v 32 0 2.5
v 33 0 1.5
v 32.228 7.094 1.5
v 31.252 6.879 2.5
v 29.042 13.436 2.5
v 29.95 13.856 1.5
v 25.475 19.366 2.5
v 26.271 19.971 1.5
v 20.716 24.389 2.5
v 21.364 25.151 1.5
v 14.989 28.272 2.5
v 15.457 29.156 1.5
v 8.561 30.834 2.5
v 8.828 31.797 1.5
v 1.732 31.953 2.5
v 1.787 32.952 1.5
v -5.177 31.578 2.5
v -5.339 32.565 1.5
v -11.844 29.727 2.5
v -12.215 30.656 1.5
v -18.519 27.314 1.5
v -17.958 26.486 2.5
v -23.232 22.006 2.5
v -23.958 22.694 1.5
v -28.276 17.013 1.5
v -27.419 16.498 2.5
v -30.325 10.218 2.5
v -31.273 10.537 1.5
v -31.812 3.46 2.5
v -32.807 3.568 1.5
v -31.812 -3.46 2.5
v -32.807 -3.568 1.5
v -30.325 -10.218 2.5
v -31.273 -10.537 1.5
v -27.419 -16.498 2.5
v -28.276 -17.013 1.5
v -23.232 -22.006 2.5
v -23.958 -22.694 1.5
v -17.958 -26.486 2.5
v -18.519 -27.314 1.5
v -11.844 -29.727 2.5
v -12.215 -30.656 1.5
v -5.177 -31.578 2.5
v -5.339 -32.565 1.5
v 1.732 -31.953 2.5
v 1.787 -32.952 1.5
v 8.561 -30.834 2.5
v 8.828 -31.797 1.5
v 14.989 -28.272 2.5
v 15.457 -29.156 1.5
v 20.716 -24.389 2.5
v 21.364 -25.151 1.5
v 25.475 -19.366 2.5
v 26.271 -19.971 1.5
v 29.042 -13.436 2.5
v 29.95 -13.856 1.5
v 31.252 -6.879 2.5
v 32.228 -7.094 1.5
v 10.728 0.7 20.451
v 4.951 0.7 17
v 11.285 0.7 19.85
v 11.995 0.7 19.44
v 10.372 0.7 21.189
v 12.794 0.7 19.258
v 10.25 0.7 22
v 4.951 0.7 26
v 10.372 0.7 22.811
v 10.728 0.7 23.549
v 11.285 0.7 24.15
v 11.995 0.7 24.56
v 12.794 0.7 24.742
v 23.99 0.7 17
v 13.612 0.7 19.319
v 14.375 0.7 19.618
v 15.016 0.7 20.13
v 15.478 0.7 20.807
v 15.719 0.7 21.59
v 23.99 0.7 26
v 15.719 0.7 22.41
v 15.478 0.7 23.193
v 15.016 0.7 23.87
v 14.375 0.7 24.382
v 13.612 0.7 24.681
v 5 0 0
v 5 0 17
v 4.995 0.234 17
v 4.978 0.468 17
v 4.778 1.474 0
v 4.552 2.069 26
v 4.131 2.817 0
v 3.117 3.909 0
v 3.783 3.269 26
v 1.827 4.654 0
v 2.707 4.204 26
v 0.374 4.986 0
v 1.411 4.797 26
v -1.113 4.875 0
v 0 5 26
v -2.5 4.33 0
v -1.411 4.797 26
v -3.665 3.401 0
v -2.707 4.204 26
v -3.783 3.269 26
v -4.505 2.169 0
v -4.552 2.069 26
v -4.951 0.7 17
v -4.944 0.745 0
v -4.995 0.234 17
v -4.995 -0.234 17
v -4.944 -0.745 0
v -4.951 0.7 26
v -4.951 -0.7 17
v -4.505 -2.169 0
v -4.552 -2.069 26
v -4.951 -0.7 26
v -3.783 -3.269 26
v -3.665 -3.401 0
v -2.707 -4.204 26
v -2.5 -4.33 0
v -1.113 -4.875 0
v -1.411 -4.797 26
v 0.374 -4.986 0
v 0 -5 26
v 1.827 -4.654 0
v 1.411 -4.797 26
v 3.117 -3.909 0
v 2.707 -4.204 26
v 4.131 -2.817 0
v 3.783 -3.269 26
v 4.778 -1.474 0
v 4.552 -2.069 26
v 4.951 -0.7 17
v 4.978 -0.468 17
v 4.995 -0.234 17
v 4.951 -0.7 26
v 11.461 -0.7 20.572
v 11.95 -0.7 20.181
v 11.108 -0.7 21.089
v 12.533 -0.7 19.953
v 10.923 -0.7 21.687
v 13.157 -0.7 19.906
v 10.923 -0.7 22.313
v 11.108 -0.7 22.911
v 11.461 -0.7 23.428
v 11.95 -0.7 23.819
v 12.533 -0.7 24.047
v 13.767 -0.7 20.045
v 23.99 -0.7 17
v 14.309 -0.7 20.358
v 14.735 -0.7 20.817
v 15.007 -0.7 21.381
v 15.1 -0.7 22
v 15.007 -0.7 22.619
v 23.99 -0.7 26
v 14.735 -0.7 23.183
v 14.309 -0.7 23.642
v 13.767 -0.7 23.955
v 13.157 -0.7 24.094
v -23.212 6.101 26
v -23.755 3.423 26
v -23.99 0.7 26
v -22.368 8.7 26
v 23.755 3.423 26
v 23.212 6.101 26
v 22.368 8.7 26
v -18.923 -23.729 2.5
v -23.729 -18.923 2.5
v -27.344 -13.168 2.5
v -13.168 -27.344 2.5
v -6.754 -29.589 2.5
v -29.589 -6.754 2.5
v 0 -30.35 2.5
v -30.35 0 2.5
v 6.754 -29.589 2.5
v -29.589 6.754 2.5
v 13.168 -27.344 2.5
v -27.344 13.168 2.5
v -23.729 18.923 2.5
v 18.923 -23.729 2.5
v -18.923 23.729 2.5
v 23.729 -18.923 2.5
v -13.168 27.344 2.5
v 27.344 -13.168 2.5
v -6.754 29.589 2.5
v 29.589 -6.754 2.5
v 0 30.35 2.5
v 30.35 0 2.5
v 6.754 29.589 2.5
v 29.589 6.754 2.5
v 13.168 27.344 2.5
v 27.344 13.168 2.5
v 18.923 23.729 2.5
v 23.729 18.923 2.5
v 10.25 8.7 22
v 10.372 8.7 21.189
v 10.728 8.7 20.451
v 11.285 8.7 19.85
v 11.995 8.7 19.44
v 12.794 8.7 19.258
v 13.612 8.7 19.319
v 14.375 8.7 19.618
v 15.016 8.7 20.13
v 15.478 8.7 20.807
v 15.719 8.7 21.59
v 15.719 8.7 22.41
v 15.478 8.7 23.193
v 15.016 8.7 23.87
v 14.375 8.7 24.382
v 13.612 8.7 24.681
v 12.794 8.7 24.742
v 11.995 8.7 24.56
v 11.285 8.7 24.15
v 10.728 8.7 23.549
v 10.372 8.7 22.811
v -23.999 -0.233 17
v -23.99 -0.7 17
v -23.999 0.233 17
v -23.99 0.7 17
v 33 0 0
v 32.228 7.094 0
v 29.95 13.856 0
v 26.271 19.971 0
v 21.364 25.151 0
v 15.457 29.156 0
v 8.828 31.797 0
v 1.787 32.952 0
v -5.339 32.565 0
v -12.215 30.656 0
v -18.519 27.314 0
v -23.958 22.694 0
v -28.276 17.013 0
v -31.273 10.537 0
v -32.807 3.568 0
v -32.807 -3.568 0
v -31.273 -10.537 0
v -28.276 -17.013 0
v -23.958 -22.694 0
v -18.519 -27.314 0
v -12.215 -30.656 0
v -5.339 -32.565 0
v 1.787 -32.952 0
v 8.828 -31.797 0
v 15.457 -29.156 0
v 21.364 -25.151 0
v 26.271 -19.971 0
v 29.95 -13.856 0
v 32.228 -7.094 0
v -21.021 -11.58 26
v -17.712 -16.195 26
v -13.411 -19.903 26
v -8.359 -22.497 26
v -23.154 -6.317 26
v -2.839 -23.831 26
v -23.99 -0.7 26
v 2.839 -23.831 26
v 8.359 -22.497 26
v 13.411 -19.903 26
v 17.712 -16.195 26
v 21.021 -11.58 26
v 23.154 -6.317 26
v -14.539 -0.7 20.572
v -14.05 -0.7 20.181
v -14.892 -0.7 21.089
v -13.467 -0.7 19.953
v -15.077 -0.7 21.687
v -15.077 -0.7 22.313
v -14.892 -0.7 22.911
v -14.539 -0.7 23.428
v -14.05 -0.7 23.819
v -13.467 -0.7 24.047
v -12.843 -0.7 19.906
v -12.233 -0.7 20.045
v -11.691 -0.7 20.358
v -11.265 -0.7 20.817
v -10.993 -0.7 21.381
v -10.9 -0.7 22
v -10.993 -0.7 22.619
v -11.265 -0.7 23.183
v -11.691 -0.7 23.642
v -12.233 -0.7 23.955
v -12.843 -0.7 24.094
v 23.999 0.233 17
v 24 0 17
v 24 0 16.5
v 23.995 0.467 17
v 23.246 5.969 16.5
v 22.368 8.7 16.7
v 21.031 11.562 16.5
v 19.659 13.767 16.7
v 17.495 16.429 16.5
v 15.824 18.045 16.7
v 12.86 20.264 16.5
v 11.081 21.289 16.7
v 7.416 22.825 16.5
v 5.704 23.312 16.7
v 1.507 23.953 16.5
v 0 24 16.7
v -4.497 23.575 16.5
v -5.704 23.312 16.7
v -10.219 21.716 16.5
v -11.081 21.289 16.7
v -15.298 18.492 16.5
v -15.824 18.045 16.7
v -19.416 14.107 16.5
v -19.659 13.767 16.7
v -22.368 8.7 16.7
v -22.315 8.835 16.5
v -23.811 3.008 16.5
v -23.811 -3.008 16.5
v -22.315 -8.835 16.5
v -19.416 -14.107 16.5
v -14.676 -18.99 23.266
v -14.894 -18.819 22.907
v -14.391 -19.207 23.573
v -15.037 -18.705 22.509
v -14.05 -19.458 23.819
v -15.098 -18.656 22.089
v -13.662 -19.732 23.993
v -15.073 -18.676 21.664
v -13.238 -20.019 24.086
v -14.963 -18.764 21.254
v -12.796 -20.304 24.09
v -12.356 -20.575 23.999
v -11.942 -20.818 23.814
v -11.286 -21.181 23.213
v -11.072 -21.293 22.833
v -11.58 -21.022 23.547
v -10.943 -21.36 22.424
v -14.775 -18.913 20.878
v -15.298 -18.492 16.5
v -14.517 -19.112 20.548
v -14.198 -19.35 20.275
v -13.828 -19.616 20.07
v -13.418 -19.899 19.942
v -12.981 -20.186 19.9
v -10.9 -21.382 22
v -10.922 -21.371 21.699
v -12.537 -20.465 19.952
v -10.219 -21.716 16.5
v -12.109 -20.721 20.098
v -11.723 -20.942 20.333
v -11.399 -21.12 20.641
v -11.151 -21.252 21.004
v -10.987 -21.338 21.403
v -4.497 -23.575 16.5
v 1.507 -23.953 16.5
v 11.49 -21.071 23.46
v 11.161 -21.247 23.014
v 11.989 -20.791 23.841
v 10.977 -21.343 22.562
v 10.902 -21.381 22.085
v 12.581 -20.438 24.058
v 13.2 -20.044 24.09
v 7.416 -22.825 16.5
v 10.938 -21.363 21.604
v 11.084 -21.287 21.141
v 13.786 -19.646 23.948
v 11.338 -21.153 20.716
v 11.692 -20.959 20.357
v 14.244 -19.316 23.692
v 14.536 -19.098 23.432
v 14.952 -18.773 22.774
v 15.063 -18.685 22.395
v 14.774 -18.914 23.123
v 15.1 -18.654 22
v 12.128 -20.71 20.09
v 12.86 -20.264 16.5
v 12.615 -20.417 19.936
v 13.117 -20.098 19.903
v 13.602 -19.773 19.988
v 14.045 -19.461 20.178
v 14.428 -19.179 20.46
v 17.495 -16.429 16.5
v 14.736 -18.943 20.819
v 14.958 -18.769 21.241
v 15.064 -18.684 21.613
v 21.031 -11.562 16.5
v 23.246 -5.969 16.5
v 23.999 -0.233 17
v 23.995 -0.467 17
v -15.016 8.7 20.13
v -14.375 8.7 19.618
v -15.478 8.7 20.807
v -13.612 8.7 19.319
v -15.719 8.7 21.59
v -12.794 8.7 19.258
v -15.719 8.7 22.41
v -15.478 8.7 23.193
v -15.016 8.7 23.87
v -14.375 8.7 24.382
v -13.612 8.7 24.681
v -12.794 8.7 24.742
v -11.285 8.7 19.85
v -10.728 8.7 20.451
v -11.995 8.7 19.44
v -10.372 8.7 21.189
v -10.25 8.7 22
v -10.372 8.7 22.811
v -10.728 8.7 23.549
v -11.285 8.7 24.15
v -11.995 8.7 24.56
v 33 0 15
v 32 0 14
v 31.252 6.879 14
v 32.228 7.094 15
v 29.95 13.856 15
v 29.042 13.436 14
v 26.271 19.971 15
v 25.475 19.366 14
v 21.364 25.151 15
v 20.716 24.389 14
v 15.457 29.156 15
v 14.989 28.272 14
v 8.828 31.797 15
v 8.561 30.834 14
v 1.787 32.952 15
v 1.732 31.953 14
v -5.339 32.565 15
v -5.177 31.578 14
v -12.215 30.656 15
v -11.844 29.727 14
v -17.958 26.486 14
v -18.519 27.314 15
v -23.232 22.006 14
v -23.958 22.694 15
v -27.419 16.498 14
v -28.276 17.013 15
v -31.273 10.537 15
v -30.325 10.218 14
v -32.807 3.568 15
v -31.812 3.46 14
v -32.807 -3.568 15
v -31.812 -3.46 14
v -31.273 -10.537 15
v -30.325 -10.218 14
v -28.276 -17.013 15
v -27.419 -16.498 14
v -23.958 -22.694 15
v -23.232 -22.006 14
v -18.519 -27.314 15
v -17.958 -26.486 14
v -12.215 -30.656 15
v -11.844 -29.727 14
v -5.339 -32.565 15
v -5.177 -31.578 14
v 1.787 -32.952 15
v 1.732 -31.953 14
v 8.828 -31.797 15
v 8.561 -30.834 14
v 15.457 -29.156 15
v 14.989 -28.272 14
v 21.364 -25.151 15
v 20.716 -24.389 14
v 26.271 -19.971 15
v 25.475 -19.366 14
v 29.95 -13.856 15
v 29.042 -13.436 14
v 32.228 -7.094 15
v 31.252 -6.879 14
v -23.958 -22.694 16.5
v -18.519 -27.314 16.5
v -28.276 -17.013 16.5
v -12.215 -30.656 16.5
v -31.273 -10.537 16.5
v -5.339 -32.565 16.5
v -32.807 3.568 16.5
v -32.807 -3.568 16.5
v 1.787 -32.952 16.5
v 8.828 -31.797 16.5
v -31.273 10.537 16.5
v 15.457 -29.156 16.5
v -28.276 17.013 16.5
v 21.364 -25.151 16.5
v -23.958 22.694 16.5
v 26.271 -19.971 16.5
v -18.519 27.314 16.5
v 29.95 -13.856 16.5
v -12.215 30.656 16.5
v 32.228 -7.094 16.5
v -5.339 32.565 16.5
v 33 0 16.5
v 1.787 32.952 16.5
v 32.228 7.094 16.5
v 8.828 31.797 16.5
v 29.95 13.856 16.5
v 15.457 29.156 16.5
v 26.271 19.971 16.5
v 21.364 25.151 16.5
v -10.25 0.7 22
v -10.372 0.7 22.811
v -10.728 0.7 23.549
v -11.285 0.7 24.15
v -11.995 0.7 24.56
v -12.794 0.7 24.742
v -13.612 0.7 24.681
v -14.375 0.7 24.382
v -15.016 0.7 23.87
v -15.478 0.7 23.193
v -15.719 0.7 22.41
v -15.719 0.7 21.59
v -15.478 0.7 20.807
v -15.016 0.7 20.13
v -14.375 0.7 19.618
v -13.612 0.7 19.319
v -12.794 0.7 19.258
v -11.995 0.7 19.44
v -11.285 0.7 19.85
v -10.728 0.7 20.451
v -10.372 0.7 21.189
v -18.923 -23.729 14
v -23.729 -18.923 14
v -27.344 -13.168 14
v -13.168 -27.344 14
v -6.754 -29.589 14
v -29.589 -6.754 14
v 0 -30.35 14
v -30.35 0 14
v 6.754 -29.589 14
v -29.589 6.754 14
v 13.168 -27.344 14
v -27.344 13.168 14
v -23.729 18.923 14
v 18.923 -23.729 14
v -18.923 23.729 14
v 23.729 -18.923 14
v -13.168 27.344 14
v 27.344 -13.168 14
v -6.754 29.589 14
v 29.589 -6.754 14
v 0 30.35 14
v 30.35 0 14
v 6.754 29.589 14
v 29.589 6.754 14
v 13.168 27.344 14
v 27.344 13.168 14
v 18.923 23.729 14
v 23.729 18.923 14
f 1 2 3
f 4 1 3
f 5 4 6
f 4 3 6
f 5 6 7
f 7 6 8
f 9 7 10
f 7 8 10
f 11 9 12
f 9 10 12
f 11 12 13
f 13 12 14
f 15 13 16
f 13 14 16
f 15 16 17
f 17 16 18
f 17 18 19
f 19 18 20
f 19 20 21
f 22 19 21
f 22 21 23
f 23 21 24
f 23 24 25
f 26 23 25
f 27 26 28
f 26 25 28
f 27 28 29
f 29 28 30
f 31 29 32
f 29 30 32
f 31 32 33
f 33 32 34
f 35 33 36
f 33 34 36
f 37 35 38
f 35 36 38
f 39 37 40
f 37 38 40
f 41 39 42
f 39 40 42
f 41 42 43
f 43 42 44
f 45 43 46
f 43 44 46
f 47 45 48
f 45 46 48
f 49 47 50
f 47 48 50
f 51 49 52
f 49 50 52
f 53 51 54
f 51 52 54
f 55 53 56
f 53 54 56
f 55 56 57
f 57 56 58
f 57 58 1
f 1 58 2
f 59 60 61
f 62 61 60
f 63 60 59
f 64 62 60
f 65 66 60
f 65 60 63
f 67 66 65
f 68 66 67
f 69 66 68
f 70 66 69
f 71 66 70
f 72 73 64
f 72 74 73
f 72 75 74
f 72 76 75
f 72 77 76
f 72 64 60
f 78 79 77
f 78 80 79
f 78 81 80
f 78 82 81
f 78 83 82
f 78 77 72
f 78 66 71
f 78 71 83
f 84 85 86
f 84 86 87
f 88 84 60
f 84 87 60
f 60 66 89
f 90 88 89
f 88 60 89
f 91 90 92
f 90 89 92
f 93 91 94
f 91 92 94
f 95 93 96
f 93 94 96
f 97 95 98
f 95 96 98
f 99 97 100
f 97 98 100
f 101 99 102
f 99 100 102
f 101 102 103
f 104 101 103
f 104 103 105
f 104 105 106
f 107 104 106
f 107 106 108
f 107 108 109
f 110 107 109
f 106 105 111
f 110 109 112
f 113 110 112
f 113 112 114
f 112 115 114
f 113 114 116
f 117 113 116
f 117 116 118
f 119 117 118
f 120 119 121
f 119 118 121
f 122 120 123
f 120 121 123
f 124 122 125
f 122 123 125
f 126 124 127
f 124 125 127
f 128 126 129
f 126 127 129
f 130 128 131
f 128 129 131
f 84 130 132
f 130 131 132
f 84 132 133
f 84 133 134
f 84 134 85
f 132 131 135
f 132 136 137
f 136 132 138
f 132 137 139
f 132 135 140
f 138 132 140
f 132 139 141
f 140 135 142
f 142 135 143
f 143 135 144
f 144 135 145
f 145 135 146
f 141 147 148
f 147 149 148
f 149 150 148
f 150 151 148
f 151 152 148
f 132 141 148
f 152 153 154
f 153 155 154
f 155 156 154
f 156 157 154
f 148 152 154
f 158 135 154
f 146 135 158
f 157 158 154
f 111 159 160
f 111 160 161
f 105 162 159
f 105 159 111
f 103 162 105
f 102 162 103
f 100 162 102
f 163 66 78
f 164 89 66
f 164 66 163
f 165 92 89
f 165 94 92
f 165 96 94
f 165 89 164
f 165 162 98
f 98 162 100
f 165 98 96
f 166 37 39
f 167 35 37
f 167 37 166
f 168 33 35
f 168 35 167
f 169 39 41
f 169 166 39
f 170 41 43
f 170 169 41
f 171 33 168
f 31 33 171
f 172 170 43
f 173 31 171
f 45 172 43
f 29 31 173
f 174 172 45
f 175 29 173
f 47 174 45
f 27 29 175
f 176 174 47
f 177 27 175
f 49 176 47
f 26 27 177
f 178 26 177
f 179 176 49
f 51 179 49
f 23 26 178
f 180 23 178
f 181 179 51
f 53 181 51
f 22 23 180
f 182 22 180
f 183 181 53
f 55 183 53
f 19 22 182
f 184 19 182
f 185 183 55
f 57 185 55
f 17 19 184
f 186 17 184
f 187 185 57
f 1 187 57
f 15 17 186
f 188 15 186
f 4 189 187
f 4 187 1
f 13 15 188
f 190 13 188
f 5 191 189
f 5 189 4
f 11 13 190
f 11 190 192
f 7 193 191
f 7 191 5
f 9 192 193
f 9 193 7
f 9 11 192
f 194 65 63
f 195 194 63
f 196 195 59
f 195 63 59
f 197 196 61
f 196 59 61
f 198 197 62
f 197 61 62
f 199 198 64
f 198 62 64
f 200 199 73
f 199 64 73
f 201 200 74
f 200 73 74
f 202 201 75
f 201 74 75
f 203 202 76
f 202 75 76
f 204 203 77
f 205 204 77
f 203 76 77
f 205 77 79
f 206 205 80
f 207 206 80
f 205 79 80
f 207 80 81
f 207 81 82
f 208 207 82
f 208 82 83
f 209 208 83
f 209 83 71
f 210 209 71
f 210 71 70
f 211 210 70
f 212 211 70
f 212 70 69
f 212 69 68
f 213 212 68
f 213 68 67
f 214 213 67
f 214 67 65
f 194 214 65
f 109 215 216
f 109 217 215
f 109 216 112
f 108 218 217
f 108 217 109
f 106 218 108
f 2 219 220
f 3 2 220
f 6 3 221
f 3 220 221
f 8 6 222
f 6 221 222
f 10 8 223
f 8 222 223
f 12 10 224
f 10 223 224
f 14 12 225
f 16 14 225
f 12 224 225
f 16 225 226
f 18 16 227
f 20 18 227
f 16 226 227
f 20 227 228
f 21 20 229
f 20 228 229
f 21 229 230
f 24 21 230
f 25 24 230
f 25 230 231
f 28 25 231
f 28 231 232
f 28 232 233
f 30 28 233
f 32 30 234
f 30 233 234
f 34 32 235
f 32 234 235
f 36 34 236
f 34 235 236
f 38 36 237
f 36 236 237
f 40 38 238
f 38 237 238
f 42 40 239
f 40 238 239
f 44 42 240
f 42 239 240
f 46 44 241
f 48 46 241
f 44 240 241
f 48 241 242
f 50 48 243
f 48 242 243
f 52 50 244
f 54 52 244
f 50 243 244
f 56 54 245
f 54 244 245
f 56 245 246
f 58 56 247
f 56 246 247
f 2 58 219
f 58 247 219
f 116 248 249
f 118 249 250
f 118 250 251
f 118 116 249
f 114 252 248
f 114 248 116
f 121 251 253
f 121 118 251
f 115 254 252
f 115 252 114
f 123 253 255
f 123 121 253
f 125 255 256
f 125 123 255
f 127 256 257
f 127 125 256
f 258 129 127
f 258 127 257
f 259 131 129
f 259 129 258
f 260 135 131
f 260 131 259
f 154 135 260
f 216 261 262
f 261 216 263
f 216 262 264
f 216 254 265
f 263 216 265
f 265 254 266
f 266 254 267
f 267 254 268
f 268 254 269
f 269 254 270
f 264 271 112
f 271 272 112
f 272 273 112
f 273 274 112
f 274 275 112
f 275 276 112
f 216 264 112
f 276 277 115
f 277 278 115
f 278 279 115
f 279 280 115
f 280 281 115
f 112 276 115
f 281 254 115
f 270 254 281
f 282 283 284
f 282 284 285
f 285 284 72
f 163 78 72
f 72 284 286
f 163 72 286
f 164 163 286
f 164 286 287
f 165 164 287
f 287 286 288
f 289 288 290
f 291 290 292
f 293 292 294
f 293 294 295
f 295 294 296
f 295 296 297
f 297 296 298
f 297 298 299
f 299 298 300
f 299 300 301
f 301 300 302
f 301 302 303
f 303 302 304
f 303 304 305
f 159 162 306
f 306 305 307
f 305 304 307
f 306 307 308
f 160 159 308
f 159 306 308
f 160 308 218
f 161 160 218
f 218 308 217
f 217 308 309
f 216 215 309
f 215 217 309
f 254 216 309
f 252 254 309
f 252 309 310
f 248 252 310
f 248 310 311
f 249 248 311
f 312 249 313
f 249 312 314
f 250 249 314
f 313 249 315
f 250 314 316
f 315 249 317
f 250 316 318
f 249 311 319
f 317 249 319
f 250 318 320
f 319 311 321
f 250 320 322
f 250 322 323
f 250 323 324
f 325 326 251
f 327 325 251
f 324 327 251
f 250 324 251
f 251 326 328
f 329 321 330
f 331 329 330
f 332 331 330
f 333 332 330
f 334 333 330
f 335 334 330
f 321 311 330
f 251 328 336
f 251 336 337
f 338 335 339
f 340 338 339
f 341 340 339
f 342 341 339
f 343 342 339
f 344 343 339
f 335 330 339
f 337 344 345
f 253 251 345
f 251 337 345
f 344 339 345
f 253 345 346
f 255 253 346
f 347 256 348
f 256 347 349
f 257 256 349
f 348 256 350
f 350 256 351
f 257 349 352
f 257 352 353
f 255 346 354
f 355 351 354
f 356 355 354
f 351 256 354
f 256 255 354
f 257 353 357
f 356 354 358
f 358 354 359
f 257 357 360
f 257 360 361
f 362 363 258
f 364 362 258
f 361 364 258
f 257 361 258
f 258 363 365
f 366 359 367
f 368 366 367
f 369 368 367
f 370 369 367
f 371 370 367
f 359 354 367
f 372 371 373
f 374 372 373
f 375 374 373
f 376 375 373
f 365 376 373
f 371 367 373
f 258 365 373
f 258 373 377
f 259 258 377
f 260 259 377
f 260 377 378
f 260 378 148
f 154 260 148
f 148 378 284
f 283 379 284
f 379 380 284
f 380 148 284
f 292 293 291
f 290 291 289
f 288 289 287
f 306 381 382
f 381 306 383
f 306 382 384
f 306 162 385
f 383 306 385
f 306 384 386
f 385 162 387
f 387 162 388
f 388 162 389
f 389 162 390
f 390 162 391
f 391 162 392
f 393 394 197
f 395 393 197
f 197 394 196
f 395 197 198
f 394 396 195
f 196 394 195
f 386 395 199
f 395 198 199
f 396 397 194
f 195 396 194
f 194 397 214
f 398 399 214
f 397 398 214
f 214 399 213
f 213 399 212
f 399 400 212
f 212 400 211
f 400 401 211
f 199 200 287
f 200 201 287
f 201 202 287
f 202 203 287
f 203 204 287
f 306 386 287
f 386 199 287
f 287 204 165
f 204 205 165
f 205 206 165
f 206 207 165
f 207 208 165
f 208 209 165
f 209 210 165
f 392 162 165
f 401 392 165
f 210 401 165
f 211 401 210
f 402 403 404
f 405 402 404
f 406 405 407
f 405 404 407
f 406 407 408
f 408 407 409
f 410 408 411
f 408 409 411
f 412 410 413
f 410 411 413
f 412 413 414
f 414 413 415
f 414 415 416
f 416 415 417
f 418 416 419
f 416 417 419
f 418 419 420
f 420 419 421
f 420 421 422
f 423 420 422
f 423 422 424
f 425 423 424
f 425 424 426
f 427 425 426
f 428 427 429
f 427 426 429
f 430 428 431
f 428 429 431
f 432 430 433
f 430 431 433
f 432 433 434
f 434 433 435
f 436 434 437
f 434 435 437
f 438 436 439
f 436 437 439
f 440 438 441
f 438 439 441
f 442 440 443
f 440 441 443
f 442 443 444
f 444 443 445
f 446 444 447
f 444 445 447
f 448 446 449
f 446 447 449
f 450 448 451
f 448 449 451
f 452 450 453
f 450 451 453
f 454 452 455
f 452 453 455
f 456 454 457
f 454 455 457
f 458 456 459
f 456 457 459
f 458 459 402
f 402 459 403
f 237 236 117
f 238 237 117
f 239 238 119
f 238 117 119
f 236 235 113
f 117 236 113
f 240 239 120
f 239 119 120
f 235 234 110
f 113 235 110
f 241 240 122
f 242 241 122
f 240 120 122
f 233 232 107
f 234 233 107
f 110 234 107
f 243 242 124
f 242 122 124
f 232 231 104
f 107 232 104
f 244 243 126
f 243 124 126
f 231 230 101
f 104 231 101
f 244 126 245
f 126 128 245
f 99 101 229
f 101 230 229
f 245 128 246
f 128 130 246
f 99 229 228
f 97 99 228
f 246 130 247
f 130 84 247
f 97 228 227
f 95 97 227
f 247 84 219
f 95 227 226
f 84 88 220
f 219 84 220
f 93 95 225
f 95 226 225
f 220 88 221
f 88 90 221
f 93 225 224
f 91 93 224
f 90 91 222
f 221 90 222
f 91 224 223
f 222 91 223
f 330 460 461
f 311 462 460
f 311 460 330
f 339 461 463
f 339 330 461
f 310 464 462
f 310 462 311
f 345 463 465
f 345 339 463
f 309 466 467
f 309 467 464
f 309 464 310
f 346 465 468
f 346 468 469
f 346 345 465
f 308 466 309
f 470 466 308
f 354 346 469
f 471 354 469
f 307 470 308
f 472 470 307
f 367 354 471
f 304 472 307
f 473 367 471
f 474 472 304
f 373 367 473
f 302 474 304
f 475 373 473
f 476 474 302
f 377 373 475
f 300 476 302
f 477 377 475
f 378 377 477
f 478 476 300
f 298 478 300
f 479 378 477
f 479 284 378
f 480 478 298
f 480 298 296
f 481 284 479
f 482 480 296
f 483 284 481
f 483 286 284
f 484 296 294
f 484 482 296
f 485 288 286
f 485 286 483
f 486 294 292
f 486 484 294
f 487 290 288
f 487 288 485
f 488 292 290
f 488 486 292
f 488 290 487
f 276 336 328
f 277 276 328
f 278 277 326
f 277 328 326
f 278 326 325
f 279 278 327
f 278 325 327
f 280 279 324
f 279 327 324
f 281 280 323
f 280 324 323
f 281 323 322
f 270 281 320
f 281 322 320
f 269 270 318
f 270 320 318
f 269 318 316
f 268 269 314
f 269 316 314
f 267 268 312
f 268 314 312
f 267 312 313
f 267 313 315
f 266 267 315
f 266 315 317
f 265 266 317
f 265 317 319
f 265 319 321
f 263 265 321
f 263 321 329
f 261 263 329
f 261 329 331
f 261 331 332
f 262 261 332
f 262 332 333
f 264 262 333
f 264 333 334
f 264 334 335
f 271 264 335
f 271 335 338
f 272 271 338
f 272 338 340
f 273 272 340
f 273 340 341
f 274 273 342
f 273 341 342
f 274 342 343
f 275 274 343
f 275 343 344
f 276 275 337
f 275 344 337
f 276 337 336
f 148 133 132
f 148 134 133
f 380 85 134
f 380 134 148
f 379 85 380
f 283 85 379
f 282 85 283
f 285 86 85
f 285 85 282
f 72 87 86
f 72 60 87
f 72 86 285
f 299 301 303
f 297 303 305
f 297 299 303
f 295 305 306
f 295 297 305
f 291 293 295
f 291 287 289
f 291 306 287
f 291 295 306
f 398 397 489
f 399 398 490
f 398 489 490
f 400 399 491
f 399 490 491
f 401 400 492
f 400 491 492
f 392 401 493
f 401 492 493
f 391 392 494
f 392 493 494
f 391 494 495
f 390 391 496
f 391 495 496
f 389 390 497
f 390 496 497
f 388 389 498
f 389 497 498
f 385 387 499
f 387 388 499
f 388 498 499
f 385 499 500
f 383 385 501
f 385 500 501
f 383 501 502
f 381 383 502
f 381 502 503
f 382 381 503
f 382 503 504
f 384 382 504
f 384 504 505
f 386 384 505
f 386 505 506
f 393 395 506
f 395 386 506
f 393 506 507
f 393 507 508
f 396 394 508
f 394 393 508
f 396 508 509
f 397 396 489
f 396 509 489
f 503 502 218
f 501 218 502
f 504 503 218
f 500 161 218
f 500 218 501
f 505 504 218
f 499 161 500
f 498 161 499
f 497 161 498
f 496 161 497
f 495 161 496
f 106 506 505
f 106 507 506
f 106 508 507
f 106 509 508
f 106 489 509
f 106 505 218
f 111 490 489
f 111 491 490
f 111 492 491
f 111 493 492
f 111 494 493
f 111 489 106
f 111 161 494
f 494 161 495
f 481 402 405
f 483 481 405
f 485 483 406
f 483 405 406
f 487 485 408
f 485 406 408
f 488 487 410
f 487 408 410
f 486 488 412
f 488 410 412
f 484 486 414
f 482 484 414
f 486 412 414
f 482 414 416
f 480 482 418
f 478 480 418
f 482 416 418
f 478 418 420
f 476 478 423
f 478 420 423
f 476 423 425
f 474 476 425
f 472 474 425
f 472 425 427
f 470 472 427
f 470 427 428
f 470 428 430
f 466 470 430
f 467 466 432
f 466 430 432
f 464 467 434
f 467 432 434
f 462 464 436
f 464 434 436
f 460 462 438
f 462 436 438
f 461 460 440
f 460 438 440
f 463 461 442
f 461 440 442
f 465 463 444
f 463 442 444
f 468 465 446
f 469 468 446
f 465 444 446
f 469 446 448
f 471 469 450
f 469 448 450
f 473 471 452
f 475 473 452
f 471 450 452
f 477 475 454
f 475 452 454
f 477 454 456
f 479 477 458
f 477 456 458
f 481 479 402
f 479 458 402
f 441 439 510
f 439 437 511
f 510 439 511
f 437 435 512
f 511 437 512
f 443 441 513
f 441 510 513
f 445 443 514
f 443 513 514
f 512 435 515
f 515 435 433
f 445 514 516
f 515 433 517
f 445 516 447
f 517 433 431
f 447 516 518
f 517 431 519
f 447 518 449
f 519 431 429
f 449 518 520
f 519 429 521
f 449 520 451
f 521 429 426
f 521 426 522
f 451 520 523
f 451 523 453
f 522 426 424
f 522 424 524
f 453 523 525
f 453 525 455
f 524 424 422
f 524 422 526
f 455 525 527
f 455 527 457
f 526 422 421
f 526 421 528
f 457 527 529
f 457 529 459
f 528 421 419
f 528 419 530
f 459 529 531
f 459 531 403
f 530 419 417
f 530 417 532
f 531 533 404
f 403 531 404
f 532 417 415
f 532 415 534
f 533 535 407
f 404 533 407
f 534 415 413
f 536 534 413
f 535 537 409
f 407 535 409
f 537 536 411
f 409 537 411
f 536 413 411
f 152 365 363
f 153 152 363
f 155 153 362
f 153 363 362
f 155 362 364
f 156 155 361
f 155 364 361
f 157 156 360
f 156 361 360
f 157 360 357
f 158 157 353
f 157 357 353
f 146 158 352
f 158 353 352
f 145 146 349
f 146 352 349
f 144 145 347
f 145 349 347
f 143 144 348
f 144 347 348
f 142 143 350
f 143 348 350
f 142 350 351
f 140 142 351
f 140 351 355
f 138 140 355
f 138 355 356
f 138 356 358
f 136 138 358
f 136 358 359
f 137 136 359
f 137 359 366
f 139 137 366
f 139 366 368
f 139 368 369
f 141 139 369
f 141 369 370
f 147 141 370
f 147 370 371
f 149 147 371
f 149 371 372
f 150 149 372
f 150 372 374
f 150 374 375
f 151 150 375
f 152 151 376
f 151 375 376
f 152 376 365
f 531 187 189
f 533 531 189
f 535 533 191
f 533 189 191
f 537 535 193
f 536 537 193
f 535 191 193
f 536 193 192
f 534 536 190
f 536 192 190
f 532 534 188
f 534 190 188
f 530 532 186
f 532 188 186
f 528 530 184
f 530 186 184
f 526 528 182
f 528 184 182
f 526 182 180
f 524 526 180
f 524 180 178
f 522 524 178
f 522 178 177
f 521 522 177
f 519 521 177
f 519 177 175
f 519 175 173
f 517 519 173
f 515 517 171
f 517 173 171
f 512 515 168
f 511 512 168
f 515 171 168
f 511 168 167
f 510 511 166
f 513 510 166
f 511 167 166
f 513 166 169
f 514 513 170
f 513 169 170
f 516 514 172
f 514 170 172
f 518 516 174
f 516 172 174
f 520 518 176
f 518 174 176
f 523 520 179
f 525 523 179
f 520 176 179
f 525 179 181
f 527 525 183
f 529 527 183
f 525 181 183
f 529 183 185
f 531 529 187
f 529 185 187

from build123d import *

# Parameters (mm, degrees)
SKETCH_1_R          = 33
EXTRUDE_1_DEPTH     = 2.5
SKETCH_2_R          = 30.35
EXTRUDE_2_DEPTH     = 11.5
SKETCH_3_R          = 33
EXTRUDE_3_DEPTH     = 2.5
SKETCH_4_R          = 24
EXTRUDE_4_DEPTH     = 9.5
CHAMFER_1_SIZE      = 1
SKETCH_5_R          = 5
CUT_EXTRUDE_1_DEPTH = 54.422841557
SKETCH_6_W          = 50
SKETCH_6_H          = 1.4
CUT_EXTRUDE_2_DEPTH = 9
SKETCH_7_R          = 2.75
CUT_EXTRUDE_3_DEPTH = 8
SKETCH_8_R          = 5
CUT_EXTRUDE_4_DEPTH = 60.193665202
HOLE_WIZARD_M5_1_D  = 4.2
SKETCH_12_W         = 10
SKETCH_12_H         = 14
CUT_EXTRUDE_5_DEPTH = 4
SKETCH_13_W         = 72.487869612
SKETCH_13_H         = 16.576438216
CUT_EXTRUDE_6_DEPTH = 9.3


with BuildPart() as part:
    # 草图1 → 凸台-拉伸1 (new body)
    with BuildSketch(Plane.XY):
        Circle(SKETCH_1_R)
    extrude(amount=EXTRUDE_1_DEPTH)

    # 草图2 → 凸台-拉伸2 (add)
    with BuildSketch(Plane.XY.offset(2.5)):
        Circle(SKETCH_2_R)
    extrude(amount=EXTRUDE_2_DEPTH)

    # 草图3 → 凸台-拉伸3 (add)
    with BuildSketch(Plane.XY.offset(14)):
        Circle(SKETCH_3_R)
    extrude(amount=EXTRUDE_3_DEPTH)

    # 草图4 → 凸台-拉伸4 (add)
    with BuildSketch(Plane.XY.offset(16.5)):
        Circle(SKETCH_4_R)
    extrude(amount=EXTRUDE_4_DEPTH)

    # 倒角1
    chamfer_1_edges = [part.edges().sort_by_distance(p)[0] for p in [
        (-33, 0, 2.5),
        (-33, 0, 14),
    ]]
    chamfer(chamfer_1_edges, length=CHAMFER_1_SIZE)

    # 草图5 → 切除-拉伸1 (cut, through all)
    with BuildSketch(Plane.XY.offset(26)):
        Circle(SKETCH_5_R)
    extrude(amount=-CUT_EXTRUDE_1_DEPTH, mode=Mode.SUBTRACT)

    # 草图6 → 切除-拉伸2 (cut)
    with BuildSketch(Plane.XY.offset(26)):
        Rectangle(SKETCH_6_W, SKETCH_6_H)
    extrude(amount=-CUT_EXTRUDE_2_DEPTH, mode=Mode.SUBTRACT)

    # 草图7 → 切除-拉伸3 (cut)
    with BuildSketch(Plane.XZ.offset(-0.7)):
        with Locations((-13, 22)):
            Circle(SKETCH_7_R)
        with Locations(Location((13, 22, 0), (0, 0, 180))):
            Circle(SKETCH_7_R)
    extrude(amount=-CUT_EXTRUDE_3_DEPTH, mode=Mode.SUBTRACT)

    # 草图8 → 切除-拉伸4 (cut, through all)
    with BuildSketch(Plane.XZ.offset(-8.7)):
        with Locations((-13, 22)):
            Circle(SKETCH_8_R)
        with Locations((13, 22)):
            Circle(SKETCH_8_R)
    extrude(amount=-CUT_EXTRUDE_4_DEPTH, mode=Mode.SUBTRACT)

    # M5 螺纹孔1 (through all)
    with Locations(Plane(origin=(0, -0.7, 0), x_dir=(-1, 0, 0), z_dir=(0, 1, 0))):
        with Locations((13, 22), (-13, 22)):
            Hole(HOLE_WIZARD_M5_1_D / 2)

    # 草图12 → 切除-拉伸5 (cut)
    with BuildSketch(Plane.XY.offset(26)):
        with Locations((-13, 15.7)):
            Rectangle(SKETCH_12_W, SKETCH_12_H)
        with Locations((13, 15.7)):
            Rectangle(SKETCH_12_W, SKETCH_12_H)
    extrude(amount=-CUT_EXTRUDE_5_DEPTH, mode=Mode.SUBTRACT)

    # 草图13 → 切除-拉伸6 (cut)
    with BuildSketch(Plane.XY.offset(26)):
        with Locations((-2.709766805, 16.988219108)):
            Rectangle(SKETCH_13_W, SKETCH_13_H)
    extrude(amount=-CUT_EXTRUDE_6_DEPTH, mode=Mode.SUBTRACT)


solid = part.part
